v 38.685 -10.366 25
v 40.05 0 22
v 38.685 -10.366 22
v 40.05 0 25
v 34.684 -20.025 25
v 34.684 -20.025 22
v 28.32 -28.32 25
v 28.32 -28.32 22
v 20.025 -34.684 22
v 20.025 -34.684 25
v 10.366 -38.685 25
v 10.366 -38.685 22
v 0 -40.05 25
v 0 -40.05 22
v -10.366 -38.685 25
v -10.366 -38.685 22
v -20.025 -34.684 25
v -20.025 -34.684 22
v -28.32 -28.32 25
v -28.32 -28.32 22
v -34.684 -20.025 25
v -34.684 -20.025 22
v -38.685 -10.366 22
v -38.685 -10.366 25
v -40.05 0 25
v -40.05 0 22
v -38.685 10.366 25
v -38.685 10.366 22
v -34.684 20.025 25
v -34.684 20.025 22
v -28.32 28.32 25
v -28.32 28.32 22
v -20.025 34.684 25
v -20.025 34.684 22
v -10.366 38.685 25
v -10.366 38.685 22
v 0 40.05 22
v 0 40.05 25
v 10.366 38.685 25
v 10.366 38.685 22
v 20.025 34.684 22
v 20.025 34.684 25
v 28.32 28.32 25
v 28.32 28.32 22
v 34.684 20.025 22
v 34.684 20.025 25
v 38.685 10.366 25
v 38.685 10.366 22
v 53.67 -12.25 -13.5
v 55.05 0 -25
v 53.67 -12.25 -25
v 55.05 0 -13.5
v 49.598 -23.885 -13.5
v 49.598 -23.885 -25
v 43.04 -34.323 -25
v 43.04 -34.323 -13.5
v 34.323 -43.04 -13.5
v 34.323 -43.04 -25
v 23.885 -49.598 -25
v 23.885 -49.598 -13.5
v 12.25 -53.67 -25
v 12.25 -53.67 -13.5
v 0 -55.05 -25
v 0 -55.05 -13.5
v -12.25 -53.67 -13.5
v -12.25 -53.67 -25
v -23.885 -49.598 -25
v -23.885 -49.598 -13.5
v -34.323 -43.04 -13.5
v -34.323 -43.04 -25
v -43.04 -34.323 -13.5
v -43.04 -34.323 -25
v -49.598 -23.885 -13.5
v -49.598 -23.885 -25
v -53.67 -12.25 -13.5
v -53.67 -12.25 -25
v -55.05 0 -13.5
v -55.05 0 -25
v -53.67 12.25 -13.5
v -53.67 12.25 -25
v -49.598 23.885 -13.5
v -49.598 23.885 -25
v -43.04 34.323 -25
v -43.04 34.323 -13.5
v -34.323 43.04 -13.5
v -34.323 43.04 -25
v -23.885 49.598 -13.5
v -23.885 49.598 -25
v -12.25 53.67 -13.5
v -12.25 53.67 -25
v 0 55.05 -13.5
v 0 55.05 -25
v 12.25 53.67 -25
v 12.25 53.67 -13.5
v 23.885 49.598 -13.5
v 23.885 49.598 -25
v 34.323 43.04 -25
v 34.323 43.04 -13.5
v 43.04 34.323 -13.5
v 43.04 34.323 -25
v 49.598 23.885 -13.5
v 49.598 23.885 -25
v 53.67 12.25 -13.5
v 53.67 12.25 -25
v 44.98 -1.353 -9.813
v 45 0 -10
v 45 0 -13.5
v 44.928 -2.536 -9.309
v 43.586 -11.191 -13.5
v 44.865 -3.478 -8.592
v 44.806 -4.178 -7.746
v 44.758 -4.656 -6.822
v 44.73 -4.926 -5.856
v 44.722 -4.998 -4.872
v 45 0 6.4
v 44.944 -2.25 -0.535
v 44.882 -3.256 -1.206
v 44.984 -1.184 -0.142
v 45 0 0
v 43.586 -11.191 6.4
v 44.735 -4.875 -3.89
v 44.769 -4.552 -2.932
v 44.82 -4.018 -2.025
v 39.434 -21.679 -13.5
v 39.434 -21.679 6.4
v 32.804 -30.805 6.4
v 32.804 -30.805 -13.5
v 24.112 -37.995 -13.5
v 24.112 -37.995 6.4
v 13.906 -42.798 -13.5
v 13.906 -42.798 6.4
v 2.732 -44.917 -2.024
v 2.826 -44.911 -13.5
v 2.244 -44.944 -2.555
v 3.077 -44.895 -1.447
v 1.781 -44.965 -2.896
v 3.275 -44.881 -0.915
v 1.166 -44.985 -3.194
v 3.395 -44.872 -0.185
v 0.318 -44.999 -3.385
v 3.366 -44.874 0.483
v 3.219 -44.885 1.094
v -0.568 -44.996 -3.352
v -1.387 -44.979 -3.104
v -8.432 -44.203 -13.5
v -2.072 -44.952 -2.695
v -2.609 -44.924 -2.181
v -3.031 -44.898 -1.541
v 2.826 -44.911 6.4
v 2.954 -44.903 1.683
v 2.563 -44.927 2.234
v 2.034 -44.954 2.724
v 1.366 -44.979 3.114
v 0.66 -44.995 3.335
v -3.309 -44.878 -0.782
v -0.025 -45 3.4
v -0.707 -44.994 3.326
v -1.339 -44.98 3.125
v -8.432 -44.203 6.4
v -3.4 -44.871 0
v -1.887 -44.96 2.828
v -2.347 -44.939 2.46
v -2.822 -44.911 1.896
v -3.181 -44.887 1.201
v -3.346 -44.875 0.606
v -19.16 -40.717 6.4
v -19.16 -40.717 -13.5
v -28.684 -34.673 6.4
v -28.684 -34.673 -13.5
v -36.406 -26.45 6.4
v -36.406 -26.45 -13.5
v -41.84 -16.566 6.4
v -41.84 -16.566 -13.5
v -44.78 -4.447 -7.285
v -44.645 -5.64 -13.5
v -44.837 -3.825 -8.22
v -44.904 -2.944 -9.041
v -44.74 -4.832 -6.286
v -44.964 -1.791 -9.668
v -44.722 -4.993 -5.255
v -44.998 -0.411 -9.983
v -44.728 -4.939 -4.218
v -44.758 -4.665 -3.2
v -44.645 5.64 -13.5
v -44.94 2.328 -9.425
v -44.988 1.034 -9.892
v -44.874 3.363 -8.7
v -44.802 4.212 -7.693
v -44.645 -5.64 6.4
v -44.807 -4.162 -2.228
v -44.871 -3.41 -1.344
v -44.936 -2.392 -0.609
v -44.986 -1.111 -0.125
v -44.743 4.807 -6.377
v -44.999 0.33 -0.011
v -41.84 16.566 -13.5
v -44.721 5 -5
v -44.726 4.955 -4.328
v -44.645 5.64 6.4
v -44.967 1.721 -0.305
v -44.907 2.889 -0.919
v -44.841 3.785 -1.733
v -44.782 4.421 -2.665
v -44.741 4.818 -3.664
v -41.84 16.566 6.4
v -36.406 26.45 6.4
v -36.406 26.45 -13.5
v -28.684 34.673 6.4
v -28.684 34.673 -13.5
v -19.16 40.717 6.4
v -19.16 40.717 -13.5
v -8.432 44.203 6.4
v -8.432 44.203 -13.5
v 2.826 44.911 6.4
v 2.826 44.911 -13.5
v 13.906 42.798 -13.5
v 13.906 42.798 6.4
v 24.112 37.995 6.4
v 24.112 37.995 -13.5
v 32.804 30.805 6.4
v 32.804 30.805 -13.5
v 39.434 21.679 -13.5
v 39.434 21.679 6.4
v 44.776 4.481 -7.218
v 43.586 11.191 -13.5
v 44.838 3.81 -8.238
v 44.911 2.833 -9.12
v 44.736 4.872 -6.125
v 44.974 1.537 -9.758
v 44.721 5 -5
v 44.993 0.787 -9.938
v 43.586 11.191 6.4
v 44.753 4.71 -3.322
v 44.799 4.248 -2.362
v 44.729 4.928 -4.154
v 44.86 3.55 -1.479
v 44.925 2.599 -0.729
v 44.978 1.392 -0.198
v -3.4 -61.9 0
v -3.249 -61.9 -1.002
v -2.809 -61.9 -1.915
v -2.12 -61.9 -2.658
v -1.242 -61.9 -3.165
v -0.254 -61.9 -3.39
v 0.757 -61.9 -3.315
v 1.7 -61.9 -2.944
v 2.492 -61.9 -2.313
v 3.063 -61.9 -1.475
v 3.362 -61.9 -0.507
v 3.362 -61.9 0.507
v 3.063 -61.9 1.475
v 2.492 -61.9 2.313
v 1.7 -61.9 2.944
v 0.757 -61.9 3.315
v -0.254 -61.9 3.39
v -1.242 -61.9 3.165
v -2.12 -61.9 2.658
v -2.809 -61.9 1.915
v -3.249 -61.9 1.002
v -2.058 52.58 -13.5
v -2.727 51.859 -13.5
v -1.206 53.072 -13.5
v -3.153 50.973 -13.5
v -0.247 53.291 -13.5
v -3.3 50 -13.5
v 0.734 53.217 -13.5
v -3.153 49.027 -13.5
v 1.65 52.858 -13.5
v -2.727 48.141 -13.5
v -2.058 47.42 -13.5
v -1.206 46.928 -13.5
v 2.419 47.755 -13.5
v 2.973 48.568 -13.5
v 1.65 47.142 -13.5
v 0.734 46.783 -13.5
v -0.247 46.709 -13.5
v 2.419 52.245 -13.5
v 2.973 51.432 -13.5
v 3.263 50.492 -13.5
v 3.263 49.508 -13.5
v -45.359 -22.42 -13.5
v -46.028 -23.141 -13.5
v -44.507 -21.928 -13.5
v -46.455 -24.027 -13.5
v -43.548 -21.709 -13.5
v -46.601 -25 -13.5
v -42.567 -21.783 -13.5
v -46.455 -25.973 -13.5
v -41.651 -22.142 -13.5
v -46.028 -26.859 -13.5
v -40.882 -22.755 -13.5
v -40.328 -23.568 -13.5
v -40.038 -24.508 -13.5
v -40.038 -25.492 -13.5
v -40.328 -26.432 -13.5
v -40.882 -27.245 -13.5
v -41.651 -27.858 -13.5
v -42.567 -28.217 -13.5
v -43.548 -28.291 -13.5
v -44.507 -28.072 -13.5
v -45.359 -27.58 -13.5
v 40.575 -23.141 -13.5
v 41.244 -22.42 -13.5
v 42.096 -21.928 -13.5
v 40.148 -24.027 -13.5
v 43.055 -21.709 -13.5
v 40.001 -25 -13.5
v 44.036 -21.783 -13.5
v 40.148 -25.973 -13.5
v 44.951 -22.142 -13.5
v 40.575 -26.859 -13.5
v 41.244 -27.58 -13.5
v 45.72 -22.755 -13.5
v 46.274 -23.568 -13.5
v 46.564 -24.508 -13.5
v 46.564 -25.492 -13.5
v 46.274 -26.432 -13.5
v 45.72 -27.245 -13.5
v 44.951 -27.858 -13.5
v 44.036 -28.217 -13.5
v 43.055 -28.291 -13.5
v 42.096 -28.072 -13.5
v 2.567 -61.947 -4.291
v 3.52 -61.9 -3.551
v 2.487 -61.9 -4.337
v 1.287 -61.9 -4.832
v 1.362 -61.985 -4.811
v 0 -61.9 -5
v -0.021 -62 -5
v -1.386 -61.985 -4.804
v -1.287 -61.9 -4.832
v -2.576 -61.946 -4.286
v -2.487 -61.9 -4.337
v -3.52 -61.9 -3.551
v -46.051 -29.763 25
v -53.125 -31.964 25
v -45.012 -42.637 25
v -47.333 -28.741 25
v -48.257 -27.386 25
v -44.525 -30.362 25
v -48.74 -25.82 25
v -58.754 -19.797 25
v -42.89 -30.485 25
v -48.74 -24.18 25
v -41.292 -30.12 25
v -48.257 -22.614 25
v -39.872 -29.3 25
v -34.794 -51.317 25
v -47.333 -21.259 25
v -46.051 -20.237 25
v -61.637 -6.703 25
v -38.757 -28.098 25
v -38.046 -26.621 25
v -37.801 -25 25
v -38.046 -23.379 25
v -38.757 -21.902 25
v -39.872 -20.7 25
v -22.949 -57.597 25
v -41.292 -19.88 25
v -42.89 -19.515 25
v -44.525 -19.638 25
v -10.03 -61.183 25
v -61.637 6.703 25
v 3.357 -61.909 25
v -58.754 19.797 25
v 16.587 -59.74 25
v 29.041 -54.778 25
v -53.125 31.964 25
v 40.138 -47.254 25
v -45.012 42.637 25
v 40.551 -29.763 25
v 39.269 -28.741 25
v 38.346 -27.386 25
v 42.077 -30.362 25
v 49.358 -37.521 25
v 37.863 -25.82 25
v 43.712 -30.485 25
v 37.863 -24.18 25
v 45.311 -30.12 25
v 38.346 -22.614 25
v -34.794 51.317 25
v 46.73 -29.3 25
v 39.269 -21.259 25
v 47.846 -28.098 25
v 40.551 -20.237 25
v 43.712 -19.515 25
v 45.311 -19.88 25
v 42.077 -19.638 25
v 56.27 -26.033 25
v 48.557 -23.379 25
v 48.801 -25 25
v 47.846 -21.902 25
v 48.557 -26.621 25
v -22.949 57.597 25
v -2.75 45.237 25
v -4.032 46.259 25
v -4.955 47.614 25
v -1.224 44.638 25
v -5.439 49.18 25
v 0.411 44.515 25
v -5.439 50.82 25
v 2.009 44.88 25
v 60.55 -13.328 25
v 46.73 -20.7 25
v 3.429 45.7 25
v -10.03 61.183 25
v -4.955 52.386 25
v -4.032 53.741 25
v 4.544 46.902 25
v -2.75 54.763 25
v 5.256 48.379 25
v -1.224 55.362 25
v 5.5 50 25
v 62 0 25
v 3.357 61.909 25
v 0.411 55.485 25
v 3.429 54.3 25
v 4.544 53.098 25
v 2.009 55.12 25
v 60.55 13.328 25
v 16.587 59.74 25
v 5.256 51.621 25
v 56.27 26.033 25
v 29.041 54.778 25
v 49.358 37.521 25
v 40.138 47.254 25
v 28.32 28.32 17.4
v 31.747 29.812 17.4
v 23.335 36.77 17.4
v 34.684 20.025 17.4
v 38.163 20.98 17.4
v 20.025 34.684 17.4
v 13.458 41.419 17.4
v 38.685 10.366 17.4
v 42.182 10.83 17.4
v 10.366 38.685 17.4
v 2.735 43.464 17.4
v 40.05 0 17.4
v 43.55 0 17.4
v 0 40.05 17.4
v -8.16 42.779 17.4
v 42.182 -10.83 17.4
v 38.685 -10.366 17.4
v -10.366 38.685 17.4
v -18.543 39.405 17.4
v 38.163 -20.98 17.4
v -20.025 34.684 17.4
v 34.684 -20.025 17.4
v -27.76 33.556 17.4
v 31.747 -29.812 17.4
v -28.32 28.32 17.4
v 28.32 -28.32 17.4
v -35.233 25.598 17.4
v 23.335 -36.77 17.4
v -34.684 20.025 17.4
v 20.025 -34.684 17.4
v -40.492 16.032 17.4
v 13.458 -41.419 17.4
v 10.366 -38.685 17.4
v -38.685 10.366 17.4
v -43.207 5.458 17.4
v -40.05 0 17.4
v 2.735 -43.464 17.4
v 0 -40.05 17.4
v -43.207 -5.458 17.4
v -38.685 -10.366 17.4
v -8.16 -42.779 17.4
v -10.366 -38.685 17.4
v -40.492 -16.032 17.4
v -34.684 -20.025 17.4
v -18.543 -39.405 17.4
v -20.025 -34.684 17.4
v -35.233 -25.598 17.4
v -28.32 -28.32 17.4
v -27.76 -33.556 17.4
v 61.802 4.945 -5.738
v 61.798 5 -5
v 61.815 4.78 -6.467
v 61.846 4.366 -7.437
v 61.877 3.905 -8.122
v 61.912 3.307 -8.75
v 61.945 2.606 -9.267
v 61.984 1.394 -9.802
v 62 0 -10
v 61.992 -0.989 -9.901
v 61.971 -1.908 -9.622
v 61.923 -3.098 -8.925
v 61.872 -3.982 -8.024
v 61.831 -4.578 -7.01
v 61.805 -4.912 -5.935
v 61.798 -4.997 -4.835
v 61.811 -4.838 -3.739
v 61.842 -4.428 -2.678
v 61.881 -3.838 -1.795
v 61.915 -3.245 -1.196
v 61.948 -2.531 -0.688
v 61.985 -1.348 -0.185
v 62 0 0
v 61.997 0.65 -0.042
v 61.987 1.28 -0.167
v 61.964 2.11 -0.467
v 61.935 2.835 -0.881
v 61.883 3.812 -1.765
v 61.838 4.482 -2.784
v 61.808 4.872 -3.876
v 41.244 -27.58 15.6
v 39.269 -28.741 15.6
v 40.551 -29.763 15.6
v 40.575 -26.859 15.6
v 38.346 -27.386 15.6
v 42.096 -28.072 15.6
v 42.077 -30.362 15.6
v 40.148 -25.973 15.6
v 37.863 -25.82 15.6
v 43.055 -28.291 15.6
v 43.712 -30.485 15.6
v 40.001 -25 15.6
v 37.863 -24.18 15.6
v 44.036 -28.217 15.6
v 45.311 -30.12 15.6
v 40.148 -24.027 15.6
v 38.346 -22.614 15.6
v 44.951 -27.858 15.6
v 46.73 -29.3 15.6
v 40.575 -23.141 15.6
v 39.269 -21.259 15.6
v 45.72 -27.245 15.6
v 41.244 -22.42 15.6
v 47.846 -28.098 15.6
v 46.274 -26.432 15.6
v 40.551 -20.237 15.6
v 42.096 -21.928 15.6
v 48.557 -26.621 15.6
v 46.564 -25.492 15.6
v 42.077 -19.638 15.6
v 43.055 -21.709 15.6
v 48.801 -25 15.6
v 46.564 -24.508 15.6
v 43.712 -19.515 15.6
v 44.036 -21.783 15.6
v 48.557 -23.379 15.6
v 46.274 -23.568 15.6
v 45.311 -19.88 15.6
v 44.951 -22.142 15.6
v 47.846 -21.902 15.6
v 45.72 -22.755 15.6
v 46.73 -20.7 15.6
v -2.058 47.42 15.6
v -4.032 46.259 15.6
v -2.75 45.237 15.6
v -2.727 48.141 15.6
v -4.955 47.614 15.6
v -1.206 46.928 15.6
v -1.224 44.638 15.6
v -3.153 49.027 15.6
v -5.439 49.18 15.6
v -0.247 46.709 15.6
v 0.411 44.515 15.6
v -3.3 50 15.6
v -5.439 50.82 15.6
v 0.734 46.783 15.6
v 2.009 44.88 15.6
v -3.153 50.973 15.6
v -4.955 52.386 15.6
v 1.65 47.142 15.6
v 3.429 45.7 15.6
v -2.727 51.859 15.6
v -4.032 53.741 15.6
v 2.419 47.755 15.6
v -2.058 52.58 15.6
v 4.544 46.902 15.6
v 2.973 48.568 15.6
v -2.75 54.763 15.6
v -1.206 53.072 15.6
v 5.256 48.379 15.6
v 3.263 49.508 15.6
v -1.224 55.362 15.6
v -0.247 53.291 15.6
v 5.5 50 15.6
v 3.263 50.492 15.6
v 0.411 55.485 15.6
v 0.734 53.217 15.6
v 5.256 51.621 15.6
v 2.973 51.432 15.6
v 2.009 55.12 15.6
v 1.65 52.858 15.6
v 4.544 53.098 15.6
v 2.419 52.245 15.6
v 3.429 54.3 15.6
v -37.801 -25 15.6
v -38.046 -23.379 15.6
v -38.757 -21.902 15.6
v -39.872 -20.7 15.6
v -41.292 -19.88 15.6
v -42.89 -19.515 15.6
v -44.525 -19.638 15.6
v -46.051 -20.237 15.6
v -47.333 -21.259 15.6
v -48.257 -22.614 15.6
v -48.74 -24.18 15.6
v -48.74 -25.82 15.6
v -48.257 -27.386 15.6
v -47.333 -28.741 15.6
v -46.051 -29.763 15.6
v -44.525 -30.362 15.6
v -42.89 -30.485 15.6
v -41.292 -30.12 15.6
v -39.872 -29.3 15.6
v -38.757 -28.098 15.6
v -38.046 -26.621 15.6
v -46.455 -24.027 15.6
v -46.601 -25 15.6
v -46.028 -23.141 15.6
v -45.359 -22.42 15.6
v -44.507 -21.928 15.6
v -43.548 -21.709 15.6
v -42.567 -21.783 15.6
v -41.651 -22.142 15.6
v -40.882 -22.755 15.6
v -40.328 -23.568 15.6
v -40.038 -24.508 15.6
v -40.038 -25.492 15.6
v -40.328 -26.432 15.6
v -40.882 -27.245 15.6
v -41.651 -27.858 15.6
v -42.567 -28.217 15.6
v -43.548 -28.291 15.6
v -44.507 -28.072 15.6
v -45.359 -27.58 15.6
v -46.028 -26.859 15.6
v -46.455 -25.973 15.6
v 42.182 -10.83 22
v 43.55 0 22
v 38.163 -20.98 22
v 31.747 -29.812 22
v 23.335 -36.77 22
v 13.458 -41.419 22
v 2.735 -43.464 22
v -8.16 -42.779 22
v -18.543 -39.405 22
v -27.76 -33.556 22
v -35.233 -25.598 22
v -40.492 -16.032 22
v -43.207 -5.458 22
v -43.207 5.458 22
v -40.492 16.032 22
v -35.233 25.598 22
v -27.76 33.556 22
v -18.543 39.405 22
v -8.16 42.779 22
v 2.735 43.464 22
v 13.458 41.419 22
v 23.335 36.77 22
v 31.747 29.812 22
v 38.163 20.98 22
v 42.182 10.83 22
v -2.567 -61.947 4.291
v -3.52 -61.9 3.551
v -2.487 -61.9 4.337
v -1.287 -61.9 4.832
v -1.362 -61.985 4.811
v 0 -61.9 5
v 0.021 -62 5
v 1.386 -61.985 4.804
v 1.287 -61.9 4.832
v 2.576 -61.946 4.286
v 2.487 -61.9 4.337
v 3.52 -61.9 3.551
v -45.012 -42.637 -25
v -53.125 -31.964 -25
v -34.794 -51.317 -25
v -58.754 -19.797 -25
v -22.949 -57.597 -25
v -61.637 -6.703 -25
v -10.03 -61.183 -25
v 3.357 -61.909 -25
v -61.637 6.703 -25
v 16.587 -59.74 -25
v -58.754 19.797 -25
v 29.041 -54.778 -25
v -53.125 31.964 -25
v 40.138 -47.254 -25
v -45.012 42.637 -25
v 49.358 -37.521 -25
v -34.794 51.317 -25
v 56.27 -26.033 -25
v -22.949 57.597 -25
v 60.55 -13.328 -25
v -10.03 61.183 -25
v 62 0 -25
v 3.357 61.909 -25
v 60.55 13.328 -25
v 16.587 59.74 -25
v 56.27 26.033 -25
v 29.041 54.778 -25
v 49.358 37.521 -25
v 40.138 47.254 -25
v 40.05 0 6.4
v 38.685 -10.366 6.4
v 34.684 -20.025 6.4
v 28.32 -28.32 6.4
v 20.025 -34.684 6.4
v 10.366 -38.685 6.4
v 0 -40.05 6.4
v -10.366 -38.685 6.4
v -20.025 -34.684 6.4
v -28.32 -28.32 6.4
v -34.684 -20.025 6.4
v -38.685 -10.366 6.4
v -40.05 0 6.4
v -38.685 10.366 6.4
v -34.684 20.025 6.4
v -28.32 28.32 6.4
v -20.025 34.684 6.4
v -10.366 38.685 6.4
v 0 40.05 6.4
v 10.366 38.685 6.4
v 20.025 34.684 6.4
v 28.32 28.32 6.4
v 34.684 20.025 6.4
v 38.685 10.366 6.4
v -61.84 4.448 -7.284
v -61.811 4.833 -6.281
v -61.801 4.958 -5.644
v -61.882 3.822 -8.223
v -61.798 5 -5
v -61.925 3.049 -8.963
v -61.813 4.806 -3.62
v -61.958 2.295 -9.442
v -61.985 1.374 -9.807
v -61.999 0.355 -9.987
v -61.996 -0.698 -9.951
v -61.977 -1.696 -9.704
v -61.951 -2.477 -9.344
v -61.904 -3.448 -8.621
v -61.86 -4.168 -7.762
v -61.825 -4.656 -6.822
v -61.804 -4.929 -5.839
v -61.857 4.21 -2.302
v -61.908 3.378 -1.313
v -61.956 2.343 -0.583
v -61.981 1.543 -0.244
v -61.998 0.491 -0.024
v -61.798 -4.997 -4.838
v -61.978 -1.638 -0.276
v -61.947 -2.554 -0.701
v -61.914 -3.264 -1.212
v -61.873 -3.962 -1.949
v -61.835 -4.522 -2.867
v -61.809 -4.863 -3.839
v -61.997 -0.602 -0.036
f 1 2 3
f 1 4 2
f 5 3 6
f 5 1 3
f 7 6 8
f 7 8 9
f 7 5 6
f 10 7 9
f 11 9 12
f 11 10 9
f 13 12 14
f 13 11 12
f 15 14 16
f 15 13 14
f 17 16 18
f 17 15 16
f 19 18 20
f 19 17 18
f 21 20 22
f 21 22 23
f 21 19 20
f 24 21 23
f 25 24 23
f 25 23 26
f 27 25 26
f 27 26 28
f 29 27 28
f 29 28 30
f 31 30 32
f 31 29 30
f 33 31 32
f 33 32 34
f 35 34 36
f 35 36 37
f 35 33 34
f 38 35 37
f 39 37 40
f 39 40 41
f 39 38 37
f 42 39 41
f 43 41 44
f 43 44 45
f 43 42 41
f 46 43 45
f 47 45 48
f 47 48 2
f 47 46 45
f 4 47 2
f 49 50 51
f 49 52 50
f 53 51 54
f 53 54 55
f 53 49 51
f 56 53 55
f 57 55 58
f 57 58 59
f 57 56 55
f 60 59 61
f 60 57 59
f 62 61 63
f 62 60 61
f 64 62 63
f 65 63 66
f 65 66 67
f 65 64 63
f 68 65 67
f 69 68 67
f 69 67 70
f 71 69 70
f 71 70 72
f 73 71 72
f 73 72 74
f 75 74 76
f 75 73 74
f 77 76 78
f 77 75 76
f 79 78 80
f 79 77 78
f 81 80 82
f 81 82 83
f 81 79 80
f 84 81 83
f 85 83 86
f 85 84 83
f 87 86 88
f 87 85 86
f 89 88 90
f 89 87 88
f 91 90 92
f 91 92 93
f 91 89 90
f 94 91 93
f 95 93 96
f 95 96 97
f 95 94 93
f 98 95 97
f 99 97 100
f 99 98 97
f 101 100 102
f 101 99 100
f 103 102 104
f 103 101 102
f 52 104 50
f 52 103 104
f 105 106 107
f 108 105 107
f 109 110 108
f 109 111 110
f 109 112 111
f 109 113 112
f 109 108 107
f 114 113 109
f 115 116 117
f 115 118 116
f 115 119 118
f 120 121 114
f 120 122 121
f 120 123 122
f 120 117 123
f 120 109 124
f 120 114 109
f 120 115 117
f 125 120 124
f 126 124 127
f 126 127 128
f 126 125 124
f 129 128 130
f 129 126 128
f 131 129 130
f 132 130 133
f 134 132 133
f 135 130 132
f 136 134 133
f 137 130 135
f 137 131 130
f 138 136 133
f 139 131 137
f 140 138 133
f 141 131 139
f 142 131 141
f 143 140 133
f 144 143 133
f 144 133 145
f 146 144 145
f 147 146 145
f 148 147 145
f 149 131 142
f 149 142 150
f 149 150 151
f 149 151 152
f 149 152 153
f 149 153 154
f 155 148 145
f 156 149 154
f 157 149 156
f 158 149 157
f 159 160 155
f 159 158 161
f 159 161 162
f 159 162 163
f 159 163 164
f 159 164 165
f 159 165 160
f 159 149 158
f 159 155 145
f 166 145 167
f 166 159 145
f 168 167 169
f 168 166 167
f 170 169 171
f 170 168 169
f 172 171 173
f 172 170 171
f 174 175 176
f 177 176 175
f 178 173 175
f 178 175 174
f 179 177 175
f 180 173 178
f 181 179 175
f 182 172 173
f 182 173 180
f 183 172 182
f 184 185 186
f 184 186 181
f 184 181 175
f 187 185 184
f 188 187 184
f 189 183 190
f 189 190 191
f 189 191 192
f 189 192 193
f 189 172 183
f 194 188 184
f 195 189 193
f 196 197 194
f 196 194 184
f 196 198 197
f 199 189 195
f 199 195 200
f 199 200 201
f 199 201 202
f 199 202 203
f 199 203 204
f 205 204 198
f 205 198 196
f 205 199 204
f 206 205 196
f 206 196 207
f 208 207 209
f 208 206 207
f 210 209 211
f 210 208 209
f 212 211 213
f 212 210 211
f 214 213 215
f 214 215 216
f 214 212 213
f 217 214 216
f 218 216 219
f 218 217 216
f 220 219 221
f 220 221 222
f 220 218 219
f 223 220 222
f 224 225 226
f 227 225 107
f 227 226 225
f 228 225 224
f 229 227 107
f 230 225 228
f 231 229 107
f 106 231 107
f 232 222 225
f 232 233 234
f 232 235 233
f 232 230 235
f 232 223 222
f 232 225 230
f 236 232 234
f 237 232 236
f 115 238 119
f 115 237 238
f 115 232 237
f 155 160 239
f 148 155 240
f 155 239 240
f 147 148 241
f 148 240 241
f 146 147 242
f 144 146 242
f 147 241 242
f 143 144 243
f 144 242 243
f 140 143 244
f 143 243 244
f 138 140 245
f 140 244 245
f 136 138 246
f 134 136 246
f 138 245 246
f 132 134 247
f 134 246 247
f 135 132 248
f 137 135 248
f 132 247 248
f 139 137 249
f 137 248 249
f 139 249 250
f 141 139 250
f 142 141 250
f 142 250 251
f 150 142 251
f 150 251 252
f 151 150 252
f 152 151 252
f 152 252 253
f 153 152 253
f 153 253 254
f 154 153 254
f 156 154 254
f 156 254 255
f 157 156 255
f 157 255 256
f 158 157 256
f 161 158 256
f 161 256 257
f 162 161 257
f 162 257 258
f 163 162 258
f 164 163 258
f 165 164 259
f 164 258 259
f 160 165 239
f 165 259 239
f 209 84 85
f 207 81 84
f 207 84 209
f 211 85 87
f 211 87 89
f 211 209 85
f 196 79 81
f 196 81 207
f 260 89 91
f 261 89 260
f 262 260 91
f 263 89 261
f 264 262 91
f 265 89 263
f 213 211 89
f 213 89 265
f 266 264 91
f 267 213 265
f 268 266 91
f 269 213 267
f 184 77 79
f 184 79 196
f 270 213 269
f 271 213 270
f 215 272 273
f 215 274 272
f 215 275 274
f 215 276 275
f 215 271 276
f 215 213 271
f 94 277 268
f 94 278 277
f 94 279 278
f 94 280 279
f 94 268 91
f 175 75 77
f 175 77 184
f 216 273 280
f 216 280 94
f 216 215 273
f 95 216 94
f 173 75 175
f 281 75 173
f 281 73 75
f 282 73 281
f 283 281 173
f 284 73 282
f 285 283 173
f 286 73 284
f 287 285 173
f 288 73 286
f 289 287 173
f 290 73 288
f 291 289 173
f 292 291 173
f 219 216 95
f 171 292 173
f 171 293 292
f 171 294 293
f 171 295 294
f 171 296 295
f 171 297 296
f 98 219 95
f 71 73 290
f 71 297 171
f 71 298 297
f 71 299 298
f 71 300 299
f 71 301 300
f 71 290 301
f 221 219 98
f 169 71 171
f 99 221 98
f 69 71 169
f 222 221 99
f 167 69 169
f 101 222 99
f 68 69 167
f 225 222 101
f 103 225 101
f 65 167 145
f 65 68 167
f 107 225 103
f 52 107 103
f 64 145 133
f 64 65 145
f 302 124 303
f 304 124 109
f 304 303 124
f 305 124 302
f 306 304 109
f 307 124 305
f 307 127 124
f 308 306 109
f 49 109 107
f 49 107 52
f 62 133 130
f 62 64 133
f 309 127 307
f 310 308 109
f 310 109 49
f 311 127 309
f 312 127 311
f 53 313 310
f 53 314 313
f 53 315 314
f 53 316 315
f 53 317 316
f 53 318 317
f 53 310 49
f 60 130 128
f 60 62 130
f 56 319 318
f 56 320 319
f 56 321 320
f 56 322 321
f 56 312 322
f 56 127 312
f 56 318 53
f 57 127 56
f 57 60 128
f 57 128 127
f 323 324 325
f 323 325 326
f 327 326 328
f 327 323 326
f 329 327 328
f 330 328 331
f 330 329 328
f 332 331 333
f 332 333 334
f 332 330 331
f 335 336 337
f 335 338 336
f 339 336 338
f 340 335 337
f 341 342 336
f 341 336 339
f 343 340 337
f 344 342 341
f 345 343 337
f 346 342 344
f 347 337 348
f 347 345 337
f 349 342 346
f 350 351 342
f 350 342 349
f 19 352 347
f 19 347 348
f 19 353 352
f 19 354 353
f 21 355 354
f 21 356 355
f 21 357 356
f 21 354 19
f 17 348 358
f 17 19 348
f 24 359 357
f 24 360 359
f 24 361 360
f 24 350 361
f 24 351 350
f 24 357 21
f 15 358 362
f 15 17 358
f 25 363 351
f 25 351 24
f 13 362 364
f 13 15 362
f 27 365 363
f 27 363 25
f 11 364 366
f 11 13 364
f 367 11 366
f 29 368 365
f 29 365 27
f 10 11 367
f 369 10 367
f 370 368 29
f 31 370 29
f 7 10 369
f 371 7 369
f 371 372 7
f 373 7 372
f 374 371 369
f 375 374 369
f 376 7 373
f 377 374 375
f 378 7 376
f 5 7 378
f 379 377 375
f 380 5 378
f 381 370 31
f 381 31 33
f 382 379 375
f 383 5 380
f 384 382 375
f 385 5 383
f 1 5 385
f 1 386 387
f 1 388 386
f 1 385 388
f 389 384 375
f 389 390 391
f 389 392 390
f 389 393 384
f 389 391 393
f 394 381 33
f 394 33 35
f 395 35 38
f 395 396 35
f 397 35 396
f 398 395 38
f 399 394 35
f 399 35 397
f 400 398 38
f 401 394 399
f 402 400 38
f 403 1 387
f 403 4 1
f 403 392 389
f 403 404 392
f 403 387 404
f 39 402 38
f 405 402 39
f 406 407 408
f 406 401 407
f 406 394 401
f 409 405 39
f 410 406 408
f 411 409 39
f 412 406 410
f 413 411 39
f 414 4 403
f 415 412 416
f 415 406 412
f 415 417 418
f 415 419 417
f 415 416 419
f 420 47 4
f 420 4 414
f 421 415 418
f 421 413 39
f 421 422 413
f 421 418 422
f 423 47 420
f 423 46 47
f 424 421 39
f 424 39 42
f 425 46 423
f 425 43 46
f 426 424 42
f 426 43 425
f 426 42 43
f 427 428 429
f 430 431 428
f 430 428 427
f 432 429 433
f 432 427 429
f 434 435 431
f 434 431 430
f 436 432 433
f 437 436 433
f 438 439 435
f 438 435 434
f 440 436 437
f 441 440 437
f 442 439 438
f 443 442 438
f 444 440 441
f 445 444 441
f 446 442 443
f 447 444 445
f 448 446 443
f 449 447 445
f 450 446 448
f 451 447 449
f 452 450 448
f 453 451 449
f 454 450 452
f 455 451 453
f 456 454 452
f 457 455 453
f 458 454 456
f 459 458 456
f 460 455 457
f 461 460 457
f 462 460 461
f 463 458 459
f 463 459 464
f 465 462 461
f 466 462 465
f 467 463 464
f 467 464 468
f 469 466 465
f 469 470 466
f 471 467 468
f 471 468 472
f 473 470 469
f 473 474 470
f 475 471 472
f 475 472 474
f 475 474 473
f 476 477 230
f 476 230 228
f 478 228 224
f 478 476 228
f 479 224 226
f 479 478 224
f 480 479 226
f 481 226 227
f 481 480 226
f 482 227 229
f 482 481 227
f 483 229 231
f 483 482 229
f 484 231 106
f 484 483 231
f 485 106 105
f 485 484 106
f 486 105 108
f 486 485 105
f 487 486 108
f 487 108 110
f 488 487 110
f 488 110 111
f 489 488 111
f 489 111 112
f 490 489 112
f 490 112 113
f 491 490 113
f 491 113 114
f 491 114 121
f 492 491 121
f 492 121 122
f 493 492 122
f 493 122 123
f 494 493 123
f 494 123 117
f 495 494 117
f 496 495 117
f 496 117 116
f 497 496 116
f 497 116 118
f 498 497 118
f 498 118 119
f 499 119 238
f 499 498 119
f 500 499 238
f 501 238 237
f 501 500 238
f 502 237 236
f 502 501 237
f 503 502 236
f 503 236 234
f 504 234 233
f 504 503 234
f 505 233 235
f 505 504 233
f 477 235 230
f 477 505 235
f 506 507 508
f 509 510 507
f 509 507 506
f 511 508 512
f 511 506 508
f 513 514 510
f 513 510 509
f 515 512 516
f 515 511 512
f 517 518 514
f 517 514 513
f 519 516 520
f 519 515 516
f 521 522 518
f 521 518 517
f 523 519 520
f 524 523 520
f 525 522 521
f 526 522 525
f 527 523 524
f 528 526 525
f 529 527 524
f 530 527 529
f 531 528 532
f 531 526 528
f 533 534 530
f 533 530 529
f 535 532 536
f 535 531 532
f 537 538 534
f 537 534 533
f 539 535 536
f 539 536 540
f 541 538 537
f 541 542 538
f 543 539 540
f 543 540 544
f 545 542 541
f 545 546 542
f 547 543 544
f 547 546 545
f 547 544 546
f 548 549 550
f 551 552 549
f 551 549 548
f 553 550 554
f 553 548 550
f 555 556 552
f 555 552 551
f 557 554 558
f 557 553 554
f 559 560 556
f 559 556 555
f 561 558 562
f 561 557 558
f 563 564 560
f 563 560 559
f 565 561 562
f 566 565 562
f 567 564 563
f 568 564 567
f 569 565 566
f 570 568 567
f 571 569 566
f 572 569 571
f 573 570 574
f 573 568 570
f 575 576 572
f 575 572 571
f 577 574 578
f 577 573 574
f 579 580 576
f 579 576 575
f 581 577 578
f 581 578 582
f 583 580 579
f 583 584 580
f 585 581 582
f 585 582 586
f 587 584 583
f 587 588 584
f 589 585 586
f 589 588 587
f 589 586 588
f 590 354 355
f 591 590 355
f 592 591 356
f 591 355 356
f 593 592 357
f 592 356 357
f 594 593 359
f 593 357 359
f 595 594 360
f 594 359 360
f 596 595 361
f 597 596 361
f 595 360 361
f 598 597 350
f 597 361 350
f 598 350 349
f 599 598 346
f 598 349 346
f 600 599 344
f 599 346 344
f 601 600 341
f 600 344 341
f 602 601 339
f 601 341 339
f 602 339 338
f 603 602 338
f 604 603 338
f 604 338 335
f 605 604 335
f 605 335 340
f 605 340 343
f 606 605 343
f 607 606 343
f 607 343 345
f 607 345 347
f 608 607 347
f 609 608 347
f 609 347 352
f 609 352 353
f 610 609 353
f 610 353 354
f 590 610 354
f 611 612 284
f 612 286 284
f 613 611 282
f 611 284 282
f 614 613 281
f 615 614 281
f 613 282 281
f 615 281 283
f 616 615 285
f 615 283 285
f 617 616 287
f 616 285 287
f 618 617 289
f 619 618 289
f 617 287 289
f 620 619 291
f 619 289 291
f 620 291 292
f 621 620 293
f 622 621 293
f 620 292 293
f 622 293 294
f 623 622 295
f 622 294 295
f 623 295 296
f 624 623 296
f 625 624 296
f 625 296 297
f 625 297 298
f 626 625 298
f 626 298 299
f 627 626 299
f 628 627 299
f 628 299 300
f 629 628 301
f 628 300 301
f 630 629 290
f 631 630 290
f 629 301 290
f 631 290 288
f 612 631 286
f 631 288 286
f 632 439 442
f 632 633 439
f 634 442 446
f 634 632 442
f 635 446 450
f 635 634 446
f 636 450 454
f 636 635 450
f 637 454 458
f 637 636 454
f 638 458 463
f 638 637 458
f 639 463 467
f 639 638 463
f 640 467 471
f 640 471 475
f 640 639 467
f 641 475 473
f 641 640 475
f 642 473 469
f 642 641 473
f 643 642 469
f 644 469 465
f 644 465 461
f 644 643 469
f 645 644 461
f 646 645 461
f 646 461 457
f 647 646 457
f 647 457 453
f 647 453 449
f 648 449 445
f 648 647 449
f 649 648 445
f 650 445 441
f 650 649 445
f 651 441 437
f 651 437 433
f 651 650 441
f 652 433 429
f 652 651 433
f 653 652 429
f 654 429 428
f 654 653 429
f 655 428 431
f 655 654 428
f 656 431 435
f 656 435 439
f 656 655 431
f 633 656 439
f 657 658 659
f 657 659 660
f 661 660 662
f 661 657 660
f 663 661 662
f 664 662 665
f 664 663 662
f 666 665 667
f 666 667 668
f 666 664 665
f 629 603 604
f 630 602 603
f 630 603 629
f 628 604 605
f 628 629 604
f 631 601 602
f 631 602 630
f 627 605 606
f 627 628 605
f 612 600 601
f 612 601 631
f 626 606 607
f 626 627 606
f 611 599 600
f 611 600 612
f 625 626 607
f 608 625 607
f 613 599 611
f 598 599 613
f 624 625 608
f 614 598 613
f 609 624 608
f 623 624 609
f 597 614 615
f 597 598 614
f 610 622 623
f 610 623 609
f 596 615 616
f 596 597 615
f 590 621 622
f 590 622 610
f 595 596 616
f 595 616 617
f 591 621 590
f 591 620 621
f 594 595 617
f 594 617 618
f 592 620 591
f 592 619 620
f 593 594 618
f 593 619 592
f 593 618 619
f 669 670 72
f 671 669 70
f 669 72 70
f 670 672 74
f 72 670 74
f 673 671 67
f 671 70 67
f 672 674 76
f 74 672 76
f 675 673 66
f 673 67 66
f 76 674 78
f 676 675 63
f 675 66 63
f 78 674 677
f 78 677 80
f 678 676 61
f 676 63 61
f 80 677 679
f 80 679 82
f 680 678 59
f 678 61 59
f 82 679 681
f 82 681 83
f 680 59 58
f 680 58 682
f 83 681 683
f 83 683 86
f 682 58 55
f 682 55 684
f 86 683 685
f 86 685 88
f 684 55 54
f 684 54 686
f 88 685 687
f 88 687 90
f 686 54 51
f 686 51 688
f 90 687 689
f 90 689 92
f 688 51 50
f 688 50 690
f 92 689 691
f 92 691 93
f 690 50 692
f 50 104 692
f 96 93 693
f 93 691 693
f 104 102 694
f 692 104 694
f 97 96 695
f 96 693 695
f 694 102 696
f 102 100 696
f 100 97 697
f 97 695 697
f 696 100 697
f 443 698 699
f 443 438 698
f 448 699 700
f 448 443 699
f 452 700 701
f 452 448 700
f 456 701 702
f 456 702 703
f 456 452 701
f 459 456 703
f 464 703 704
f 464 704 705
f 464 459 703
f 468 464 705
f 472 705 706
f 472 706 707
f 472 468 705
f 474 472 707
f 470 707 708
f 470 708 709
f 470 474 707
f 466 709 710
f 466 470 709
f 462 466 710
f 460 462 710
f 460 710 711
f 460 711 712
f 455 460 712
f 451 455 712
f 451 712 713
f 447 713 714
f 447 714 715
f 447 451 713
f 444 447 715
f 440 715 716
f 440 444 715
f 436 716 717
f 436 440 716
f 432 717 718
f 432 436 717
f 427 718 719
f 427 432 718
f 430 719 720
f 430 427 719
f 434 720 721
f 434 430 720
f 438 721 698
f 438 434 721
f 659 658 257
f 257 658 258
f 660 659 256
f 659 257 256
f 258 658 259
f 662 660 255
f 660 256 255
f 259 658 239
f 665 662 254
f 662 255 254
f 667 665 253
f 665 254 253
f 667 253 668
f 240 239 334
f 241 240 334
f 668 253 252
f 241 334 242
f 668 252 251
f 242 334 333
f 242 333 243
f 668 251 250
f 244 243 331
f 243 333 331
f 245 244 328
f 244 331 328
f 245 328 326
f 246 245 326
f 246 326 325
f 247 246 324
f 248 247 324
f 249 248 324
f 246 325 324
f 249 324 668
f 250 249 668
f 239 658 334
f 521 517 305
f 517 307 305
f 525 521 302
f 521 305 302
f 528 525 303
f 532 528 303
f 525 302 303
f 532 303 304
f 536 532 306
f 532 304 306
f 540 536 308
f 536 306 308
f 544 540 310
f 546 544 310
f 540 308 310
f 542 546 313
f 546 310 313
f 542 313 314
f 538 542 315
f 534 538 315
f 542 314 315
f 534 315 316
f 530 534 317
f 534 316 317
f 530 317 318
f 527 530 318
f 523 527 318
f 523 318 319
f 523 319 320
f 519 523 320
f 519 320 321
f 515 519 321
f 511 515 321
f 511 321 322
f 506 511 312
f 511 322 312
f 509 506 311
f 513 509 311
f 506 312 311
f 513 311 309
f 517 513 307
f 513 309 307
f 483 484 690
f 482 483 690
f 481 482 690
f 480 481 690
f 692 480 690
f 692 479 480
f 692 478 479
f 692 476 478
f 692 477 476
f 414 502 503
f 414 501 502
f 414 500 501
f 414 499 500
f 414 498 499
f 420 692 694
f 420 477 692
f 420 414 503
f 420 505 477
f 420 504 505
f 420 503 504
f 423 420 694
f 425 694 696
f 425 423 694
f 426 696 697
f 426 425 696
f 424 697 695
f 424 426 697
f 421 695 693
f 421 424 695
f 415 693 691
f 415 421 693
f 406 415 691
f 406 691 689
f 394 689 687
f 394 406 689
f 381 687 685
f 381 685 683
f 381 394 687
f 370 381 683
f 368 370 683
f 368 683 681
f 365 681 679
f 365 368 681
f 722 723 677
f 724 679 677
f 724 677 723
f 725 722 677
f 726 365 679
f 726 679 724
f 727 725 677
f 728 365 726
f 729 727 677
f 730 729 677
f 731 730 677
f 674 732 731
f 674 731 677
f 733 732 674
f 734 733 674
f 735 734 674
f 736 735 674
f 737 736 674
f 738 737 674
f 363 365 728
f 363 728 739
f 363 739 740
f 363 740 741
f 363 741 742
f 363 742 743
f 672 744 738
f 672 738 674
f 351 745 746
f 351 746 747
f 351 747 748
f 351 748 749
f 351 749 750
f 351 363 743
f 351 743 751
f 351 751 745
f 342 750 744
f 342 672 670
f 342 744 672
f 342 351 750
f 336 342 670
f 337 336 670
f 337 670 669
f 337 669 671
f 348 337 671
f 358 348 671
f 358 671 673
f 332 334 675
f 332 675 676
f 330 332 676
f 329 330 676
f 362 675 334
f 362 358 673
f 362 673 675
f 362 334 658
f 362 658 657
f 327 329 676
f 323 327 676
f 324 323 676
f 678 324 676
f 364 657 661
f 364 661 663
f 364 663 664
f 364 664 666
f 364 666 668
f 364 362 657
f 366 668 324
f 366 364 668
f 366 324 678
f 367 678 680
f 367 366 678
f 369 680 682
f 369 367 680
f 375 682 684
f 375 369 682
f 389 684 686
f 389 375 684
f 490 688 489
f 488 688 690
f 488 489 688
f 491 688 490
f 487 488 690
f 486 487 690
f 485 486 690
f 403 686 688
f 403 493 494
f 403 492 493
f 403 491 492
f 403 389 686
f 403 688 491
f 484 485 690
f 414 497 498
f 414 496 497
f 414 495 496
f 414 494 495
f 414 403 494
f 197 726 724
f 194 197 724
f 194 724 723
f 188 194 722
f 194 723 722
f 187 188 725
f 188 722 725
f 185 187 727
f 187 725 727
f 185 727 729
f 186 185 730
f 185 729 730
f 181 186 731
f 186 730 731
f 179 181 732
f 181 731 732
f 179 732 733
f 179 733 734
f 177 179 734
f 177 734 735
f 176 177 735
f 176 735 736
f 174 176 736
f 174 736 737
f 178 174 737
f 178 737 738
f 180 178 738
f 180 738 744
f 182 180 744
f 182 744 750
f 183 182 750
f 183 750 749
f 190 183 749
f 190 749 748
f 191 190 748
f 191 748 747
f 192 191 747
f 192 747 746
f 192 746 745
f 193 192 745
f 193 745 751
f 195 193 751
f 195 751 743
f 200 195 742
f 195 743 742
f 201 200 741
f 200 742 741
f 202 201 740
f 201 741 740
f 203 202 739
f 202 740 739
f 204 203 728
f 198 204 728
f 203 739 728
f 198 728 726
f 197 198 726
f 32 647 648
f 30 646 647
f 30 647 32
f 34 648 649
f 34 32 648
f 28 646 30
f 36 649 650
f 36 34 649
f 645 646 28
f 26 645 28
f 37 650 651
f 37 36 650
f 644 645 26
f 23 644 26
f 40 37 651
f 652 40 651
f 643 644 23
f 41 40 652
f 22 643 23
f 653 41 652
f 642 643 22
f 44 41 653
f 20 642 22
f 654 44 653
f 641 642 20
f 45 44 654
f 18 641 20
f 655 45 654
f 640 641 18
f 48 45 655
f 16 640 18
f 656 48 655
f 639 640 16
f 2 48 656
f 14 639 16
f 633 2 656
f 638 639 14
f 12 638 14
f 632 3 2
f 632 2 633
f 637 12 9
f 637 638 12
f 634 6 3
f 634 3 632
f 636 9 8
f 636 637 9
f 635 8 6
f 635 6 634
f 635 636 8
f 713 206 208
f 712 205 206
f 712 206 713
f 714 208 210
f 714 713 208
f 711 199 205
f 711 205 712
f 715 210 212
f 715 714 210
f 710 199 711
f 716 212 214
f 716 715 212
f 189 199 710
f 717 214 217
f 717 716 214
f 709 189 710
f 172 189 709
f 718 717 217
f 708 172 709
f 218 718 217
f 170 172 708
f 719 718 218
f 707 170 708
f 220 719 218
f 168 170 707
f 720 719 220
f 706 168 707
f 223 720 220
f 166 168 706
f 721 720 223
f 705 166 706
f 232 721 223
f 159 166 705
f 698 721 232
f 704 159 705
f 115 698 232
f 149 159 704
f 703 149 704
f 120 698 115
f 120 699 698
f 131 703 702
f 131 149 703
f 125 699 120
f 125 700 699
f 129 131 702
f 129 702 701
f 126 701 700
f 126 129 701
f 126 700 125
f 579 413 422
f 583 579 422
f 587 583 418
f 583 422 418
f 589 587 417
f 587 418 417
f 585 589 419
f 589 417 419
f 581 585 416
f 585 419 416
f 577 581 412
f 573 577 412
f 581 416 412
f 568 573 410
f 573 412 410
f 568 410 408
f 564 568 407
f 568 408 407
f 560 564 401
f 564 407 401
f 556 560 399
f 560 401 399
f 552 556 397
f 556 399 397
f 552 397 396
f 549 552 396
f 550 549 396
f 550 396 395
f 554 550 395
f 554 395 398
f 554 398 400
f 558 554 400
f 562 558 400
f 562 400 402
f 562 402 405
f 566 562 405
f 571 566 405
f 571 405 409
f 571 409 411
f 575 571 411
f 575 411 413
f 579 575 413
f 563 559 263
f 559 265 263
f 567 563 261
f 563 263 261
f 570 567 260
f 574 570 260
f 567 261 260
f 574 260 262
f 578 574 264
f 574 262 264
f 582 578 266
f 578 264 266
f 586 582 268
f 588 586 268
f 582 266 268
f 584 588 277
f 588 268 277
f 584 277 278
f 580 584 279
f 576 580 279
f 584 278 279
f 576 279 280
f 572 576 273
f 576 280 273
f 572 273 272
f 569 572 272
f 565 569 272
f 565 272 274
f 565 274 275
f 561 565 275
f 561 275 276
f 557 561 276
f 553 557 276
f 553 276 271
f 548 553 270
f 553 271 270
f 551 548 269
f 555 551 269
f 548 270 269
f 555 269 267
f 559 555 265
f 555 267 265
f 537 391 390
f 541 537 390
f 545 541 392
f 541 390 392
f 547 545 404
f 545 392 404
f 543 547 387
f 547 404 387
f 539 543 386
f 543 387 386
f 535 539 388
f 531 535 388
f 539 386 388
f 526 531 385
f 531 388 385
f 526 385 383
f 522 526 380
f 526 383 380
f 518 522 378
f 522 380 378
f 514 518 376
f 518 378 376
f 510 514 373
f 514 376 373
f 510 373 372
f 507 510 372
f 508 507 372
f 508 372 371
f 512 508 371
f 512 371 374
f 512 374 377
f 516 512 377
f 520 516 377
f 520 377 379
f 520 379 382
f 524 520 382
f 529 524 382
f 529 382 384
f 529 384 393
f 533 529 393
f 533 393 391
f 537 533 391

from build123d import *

# Parameters (mm, degrees)
SKIZZE1_R                                            = 62
LINEAR_AUSTRAGEN1_DEPTH                              = 25
STIRNSENKUNG_F_R_M6_ZYLINDERSCHRAUBE_MIT_D           = 6.6
STIRNSENKUNG_F_R_M6_ZYLINDERSCHRAUBE_MIT_CBORE_D     = 11
STIRNSENKUNG_F_R_M6_ZYLINDERSCHRAUBE_MIT_CBORE_DEPTH = 9.4
F_12_0_12_DURCHMESSER_BOHRUNG1_REACH                 = 142.872
F_12_0_12_DURCHMESSER_BOHRUNG1_BORE_R                = 5
SKIZZE10_R                                           = 5
SCHNITT_LINEAR_AUSTRAGEN3_DEPTH                      = 0.1
M8_GEWINDEBOHRUNG3_REACH                             = 142.784
M8_GEWINDEBOHRUNG3_BORE_R                            = 3.4


with BuildPart() as part:
    # Skizze1 → Linear austragen1 (new, symmetric)
    with BuildSketch(Plane.XY):
        Circle(SKIZZE1_R)
    extrude(amount=LINEAR_AUSTRAGEN1_DEPTH, both=True)

    # Skizze2 → Schnitt-Rotation1 (revolve, cut)
    with BuildSketch(Plane(origin=(0, 0, 0), x_dir=(0, 0, -1), z_dir=(1, 0, 0)), mode=Mode.PRIVATE) as schnitt_rotation1_sk:
        Polygon((25, 55.05), (13.5, 55.05), (13.5, 45), (-6.4, 45), (-6.4, 40.05), (-17.4, 40.05), (-17.4, 43.55), (-22, 43.55), (-22, 40.05), (-25, 40.05), (-25, 0), (25, 0), align=None)
    revolve(schnitt_rotation1_sk.sketch.rotate(Axis((0, 0, 0), (0, 0, -1)), 90), axis=Axis((0, 0, 0), (0, 0, -1)), mode=Mode.SUBTRACT)

    # Stirnsenkung für M6 Zylinderschraube mit Innensechskant1 (through all)
    with Locations(Plane(origin=(-59.191094396, 8.680738145, 25), x_dir=(1, 0, 0), z_dir=(0, 0, 1))):
        with Locations((59.191094396, 41.319261855), (102.492364585, -33.680738145), (15.889824207, -33.680738145)):
            CounterBoreHole(STIRNSENKUNG_F_R_M6_ZYLINDERSCHRAUBE_MIT_D / 2, STIRNSENKUNG_F_R_M6_ZYLINDERSCHRAUBE_MIT_CBORE_D / 2, STIRNSENKUNG_F_R_M6_ZYLINDERSCHRAUBE_MIT_CBORE_DEPTH)

    # Ø12.0 (12) Durchmesser Bohrung1 bore → Ø12.0 (12) Durchmesser Bohrung1 (cut, up to next)
    with BuildSketch(Plane(origin=(-62, 0, 0), x_dir=(0, 1, 0), z_dir=(-1, 0, 0)), mode=Mode.PRIVATE) as f_12_0_12_durchmesser_bohrung1_sk1:
        with Locations((0, 5)):
            Circle(F_12_0_12_DURCHMESSER_BOHRUNG1_BORE_R)
    f_12_0_12_durchmesser_bohrung1_tool1 = extrude(f_12_0_12_durchmesser_bohrung1_sk1.sketch, amount=-F_12_0_12_DURCHMESSER_BOHRUNG1_REACH, mode=Mode.PRIVATE) & part.part
    f_12_0_12_durchmesser_bohrung1 = f_12_0_12_durchmesser_bohrung1_tool1.solids().sort_by_distance((-62, 0, -5))[0]
    add(f_12_0_12_durchmesser_bohrung1, mode=Mode.SUBTRACT)

    # Spiegeln1: Ø12.0 (12) Durchmesser Bohrung1 across plane
    add(f_12_0_12_durchmesser_bohrung1.mirror(Plane(origin=(0, 0, 0), x_dir=(0, 0, 1), z_dir=(1, 0, 0))), mode=Mode.SUBTRACT)

    # Skizze10 → Schnitt-Linear austragen3 (cut)
    with BuildSketch(Plane(origin=(0, -62, 0), x_dir=(1, 0, 0), z_dir=(0, 1, 0))):
        Circle(SKIZZE10_R)
    extrude(amount=SCHNITT_LINEAR_AUSTRAGEN3_DEPTH, mode=Mode.SUBTRACT)

    # M8 Gewindebohrung3 bore → M8 Gewindebohrung3 (cut, up to next)
    with BuildSketch(Plane(origin=(0, -61.9, 0), x_dir=(-1, 0, 0), z_dir=(0, -1, 0)), mode=Mode.PRIVATE) as m8_gewindebohrung3_sk1:
        Circle(M8_GEWINDEBOHRUNG3_BORE_R)
    m8_gewindebohrung3_tool1 = extrude(m8_gewindebohrung3_sk1.sketch, amount=-M8_GEWINDEBOHRUNG3_REACH, mode=Mode.PRIVATE) & part.part
    add(m8_gewindebohrung3_tool1.solids().sort_by_distance((0, -61.9, 0))[0], mode=Mode.SUBTRACT)


solid = part.part
